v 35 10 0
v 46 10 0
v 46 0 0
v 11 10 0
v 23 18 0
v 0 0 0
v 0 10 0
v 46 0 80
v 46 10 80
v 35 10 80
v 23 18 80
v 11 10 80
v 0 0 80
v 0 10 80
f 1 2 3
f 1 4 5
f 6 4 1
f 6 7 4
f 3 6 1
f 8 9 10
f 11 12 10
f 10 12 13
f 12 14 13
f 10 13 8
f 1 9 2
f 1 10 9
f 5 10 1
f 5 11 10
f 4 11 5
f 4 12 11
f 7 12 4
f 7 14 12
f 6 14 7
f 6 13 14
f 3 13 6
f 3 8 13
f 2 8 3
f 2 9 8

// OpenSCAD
$fn = 32;

// ----------------------------------------------------------------------
// V guide rail: vrib, 46 mm wide
// ----------------------------------------------------------------------

// --- parameters (mm) ---
rail_w = 46;              // rail width, X
base_t = 10;              // base plate thickness
v_depth = 8;              // V feature depth / height
v_half_w = 12;            // half width of the V at the base face
plate_t = 80;             // rail length, Z (the extrusion height)

profile = [[0, 0], [46, 0], [46, 10], [35, 10], [23, 18], [11, 10], [0, 10]];  // primary outline, 7 points, counter clockwise

// --- the one profile operation ---
linear_extrude(height = plate_t) polygon(points = profile);
